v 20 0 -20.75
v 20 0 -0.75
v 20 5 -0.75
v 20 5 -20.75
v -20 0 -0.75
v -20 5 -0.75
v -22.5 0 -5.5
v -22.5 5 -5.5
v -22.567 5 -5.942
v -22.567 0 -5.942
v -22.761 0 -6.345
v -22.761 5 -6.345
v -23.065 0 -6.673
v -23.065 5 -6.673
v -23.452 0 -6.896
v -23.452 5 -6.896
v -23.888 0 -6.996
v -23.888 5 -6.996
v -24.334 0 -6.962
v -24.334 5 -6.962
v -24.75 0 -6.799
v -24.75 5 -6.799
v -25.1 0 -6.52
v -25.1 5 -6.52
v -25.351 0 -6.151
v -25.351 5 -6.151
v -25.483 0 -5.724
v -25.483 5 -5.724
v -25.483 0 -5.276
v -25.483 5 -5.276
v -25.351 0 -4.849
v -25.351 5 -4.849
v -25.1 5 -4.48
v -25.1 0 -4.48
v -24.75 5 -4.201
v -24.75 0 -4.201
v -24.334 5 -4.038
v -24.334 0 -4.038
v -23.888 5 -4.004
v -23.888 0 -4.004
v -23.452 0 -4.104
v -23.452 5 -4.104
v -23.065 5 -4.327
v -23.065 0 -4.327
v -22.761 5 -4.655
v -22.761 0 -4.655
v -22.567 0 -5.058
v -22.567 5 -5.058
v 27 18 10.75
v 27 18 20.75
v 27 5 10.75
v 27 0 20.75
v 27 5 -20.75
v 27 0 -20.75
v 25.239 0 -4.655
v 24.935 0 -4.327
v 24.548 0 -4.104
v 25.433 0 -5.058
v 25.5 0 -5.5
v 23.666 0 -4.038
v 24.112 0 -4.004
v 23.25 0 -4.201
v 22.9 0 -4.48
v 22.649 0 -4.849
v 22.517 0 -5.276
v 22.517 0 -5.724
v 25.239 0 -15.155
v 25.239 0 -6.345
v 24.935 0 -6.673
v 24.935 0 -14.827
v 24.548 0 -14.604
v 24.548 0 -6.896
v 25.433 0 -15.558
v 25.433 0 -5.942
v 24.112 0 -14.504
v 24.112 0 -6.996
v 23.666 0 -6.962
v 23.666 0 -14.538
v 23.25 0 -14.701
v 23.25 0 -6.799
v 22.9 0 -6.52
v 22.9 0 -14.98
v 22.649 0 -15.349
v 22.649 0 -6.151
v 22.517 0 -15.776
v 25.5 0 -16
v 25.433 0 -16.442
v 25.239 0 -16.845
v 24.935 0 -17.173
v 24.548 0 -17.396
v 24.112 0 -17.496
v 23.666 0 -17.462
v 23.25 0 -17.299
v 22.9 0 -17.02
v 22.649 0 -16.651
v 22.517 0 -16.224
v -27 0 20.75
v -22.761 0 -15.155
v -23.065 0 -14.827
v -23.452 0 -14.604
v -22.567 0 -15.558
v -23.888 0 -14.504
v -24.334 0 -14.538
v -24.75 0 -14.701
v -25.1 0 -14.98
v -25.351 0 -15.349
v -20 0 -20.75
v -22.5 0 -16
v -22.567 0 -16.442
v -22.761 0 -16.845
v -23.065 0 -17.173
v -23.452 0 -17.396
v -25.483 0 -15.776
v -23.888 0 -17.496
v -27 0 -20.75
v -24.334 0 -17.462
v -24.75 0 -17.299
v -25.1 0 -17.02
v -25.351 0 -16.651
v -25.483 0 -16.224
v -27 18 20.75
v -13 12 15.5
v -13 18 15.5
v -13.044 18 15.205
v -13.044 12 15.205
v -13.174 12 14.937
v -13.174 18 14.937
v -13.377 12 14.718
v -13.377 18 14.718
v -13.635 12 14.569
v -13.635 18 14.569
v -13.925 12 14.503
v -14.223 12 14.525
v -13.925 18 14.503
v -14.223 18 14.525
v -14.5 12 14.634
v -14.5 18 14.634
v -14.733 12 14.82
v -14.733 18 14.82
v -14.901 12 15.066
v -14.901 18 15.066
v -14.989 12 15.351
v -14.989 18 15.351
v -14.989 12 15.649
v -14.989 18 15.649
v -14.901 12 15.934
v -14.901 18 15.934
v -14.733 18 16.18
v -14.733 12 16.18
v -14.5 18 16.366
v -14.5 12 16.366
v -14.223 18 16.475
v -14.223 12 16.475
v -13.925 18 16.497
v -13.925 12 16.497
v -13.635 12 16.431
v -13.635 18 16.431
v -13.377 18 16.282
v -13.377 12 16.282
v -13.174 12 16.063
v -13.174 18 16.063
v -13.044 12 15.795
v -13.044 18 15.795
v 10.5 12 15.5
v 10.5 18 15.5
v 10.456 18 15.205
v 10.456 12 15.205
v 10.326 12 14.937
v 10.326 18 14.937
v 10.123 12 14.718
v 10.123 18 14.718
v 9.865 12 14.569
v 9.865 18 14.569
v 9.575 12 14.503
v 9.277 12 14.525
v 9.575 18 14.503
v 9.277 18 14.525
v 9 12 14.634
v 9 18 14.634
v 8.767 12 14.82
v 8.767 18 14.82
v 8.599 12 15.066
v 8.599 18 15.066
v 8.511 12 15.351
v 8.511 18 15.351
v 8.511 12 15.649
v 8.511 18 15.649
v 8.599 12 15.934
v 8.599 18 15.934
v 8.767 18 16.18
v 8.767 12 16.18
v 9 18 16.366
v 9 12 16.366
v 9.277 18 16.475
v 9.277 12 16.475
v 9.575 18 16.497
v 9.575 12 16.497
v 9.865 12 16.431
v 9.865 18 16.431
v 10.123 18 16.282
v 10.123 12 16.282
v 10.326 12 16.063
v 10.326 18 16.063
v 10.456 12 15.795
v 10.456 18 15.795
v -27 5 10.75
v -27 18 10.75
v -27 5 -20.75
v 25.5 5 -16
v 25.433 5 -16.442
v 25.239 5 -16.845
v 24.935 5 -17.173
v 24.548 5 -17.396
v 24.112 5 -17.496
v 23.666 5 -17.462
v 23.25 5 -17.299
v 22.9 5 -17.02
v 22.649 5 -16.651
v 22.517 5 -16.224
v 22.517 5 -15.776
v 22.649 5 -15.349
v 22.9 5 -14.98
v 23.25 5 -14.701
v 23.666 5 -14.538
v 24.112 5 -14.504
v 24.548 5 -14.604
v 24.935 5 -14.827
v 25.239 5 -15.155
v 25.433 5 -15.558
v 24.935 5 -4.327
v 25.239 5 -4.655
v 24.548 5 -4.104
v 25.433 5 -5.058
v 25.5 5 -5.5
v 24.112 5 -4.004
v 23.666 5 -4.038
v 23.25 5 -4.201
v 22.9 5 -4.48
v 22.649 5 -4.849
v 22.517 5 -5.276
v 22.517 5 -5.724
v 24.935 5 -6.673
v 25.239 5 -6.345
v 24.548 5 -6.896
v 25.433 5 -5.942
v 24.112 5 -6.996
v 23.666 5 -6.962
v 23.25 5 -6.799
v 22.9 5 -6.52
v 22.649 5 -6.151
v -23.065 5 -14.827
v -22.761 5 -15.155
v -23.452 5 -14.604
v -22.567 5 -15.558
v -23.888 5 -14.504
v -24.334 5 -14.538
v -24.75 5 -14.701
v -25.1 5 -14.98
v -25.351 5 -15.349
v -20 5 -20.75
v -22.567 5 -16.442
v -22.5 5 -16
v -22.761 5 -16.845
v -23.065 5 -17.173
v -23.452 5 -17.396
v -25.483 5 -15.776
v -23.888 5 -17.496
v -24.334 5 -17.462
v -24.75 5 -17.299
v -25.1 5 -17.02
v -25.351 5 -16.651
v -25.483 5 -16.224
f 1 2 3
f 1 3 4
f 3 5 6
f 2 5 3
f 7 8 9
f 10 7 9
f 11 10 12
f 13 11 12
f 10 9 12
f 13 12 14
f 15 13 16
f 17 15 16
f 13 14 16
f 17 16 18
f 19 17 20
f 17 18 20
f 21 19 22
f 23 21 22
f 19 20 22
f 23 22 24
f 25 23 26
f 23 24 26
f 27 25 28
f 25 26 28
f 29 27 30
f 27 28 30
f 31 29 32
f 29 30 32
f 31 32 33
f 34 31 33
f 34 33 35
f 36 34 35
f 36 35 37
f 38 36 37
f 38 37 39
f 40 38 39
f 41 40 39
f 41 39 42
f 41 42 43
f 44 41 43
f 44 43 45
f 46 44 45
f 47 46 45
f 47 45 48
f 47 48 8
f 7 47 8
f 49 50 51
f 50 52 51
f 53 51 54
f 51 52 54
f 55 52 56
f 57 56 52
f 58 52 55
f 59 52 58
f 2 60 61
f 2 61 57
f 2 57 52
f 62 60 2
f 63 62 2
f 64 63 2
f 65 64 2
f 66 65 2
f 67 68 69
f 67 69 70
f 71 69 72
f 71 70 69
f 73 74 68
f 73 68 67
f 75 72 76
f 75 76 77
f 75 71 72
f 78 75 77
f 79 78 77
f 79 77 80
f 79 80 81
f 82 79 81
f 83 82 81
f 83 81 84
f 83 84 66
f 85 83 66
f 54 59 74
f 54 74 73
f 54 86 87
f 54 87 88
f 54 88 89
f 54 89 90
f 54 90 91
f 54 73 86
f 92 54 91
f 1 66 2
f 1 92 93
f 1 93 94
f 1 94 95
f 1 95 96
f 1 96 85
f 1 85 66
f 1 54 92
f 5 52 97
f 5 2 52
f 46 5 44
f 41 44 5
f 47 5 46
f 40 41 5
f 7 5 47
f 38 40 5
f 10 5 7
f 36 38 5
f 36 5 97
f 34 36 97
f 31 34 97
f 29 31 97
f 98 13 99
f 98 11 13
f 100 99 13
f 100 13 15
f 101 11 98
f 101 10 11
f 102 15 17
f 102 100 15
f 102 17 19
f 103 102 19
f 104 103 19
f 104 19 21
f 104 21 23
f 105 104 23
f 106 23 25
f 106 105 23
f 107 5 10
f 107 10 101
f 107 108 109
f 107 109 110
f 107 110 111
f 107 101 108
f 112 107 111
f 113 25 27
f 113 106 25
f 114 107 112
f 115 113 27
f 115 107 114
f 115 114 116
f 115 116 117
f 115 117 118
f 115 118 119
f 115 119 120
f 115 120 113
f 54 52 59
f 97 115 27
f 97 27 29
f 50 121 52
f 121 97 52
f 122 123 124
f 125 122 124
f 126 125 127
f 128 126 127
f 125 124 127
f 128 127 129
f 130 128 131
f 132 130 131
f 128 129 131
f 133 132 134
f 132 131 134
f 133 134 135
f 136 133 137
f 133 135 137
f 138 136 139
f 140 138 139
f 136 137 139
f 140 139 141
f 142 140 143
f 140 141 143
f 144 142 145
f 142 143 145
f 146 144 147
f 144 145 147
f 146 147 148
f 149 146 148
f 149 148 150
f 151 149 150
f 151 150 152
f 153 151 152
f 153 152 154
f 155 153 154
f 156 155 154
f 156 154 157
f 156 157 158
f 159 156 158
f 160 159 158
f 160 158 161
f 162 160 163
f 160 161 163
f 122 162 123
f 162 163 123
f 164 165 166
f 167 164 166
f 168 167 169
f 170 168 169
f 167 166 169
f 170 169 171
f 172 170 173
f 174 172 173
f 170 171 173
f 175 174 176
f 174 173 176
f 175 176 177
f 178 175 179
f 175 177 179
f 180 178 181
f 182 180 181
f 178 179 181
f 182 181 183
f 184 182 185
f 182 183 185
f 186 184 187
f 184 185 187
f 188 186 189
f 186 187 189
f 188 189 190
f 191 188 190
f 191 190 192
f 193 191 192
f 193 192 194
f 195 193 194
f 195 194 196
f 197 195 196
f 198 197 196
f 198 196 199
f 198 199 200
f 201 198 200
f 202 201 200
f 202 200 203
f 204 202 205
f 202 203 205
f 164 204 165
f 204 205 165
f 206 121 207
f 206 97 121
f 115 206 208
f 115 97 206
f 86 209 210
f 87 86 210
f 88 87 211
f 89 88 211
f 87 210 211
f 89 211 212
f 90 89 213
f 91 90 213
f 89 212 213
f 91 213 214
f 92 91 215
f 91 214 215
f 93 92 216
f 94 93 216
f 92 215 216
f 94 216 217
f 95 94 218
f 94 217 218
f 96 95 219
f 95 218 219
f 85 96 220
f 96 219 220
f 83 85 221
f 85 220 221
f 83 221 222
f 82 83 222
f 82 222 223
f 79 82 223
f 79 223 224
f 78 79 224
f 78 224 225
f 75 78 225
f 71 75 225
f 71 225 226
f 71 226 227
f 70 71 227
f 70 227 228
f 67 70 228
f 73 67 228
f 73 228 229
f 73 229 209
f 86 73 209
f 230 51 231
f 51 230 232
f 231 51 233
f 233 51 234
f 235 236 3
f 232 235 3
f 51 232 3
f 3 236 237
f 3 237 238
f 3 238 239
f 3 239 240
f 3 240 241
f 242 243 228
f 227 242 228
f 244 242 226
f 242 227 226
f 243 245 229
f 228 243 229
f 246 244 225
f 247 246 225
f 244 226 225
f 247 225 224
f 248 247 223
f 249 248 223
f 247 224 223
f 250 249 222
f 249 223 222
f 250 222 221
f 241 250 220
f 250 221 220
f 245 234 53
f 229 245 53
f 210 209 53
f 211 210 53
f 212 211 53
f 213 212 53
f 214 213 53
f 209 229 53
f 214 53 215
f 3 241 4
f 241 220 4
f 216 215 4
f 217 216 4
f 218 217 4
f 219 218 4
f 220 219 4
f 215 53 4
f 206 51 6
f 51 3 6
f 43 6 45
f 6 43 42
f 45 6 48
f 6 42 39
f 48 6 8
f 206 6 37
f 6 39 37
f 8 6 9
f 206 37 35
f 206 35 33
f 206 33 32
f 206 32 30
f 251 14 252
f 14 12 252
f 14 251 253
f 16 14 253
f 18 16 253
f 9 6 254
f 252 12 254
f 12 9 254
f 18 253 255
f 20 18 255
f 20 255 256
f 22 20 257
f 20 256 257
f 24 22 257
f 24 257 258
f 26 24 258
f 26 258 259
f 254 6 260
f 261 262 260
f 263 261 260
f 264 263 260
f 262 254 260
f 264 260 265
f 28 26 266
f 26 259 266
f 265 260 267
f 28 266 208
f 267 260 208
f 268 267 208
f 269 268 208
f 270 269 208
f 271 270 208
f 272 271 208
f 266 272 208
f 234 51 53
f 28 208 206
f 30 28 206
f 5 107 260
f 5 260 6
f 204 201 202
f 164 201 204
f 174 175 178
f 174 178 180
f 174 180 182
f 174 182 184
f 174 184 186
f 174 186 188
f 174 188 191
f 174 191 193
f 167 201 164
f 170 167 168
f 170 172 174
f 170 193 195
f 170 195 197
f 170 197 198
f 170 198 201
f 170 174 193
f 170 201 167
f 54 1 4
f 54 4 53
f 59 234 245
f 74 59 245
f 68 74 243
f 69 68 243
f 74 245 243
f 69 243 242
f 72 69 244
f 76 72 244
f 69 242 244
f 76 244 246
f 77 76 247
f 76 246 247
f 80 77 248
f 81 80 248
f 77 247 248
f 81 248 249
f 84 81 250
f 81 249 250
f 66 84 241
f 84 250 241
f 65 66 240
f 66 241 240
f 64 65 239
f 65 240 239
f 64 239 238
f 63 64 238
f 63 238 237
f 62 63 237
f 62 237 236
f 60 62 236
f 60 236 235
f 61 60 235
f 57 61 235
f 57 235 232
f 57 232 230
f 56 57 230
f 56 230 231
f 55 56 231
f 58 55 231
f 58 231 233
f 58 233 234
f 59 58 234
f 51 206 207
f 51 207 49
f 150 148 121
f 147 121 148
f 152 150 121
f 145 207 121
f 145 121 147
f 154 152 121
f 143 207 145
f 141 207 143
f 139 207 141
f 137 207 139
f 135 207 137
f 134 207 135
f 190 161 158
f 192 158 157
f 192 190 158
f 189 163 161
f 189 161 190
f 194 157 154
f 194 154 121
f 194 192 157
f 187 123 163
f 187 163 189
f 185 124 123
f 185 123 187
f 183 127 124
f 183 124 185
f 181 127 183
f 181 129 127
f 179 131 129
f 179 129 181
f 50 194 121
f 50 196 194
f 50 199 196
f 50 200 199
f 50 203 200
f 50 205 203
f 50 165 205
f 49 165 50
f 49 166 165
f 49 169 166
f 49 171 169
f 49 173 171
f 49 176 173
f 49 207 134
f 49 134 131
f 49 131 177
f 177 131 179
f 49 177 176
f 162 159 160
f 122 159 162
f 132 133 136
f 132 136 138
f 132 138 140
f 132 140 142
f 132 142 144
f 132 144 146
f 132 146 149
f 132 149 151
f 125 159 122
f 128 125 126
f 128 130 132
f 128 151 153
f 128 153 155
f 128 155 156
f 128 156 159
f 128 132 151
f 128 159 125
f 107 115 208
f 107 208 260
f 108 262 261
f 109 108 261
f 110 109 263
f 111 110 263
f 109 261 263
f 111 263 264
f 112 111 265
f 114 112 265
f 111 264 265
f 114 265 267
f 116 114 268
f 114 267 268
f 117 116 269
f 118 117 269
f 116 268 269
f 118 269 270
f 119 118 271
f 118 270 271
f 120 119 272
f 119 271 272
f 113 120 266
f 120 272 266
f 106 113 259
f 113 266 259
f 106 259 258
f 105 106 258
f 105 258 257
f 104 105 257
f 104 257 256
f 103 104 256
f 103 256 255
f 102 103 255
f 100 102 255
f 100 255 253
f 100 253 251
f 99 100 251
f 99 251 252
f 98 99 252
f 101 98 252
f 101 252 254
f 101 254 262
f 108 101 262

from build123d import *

# Parameters (mm, degrees)
BOSS_EXTRUDE1_DEPTH = 5
SKETCH2_R           = 1.5
CUT_EXTRUDE1_DEPTH  = 6
SKETCH3_W           = 54
SKETCH3_H           = 10
BOSS_EXTRUDE2_DEPTH = 13
SKETCH4_R           = 1
CUT_EXTRUDE2_DEPTH  = 6


with BuildPart() as part:
    # Sketch1 → Boss-Extrude1 (new body)
    with BuildSketch(Plane(origin=(0, 0, 0), x_dir=(1, 0, 0), z_dir=(0, 1, 0))):
        Polygon((-20, 20.75), (-20, 0.75), (20, 0.75), (20, 20.75), (27, 20.75), (27, -20.75), (-27, -20.75), (-27, 20.75), align=None)
    extrude(amount=BOSS_EXTRUDE1_DEPTH)

    # Sketch2 → Cut-Extrude1 (cut, through all)
    with BuildSketch(Plane(origin=(0, 5, 0), x_dir=(1, 0, 0), z_dir=(0, 1, 0))):
        with Locations((-24, 16)):
            Circle(SKETCH2_R)
        with Locations((-24, 5.5)):
            Circle(SKETCH2_R)
        with Locations((24, 16)):
            Circle(SKETCH2_R)
        with Locations((24, 5.5)):
            Circle(SKETCH2_R)
    extrude(amount=-CUT_EXTRUDE1_DEPTH, mode=Mode.SUBTRACT)

    # Sketch3 → Boss-Extrude2 (add)
    with BuildSketch(Plane(origin=(0, 5, 0), x_dir=(1, 0, 0), z_dir=(0, 1, 0))):
        with Locations((0, -15.75)):
            Rectangle(SKETCH3_W, SKETCH3_H)
    extrude(amount=BOSS_EXTRUDE2_DEPTH)

    # Sketch4 → Cut-Extrude2 (cut)
    with BuildSketch(Plane(origin=(0, 18, 0), x_dir=(1, 0, 0), z_dir=(0, 1, 0))):
        with Locations((-14, -15.5)):
            Circle(SKETCH4_R)
        with Locations((9.5, -15.5)):
            Circle(SKETCH4_R)
    extrude(amount=-CUT_EXTRUDE2_DEPTH, mode=Mode.SUBTRACT)


solid = part.part
